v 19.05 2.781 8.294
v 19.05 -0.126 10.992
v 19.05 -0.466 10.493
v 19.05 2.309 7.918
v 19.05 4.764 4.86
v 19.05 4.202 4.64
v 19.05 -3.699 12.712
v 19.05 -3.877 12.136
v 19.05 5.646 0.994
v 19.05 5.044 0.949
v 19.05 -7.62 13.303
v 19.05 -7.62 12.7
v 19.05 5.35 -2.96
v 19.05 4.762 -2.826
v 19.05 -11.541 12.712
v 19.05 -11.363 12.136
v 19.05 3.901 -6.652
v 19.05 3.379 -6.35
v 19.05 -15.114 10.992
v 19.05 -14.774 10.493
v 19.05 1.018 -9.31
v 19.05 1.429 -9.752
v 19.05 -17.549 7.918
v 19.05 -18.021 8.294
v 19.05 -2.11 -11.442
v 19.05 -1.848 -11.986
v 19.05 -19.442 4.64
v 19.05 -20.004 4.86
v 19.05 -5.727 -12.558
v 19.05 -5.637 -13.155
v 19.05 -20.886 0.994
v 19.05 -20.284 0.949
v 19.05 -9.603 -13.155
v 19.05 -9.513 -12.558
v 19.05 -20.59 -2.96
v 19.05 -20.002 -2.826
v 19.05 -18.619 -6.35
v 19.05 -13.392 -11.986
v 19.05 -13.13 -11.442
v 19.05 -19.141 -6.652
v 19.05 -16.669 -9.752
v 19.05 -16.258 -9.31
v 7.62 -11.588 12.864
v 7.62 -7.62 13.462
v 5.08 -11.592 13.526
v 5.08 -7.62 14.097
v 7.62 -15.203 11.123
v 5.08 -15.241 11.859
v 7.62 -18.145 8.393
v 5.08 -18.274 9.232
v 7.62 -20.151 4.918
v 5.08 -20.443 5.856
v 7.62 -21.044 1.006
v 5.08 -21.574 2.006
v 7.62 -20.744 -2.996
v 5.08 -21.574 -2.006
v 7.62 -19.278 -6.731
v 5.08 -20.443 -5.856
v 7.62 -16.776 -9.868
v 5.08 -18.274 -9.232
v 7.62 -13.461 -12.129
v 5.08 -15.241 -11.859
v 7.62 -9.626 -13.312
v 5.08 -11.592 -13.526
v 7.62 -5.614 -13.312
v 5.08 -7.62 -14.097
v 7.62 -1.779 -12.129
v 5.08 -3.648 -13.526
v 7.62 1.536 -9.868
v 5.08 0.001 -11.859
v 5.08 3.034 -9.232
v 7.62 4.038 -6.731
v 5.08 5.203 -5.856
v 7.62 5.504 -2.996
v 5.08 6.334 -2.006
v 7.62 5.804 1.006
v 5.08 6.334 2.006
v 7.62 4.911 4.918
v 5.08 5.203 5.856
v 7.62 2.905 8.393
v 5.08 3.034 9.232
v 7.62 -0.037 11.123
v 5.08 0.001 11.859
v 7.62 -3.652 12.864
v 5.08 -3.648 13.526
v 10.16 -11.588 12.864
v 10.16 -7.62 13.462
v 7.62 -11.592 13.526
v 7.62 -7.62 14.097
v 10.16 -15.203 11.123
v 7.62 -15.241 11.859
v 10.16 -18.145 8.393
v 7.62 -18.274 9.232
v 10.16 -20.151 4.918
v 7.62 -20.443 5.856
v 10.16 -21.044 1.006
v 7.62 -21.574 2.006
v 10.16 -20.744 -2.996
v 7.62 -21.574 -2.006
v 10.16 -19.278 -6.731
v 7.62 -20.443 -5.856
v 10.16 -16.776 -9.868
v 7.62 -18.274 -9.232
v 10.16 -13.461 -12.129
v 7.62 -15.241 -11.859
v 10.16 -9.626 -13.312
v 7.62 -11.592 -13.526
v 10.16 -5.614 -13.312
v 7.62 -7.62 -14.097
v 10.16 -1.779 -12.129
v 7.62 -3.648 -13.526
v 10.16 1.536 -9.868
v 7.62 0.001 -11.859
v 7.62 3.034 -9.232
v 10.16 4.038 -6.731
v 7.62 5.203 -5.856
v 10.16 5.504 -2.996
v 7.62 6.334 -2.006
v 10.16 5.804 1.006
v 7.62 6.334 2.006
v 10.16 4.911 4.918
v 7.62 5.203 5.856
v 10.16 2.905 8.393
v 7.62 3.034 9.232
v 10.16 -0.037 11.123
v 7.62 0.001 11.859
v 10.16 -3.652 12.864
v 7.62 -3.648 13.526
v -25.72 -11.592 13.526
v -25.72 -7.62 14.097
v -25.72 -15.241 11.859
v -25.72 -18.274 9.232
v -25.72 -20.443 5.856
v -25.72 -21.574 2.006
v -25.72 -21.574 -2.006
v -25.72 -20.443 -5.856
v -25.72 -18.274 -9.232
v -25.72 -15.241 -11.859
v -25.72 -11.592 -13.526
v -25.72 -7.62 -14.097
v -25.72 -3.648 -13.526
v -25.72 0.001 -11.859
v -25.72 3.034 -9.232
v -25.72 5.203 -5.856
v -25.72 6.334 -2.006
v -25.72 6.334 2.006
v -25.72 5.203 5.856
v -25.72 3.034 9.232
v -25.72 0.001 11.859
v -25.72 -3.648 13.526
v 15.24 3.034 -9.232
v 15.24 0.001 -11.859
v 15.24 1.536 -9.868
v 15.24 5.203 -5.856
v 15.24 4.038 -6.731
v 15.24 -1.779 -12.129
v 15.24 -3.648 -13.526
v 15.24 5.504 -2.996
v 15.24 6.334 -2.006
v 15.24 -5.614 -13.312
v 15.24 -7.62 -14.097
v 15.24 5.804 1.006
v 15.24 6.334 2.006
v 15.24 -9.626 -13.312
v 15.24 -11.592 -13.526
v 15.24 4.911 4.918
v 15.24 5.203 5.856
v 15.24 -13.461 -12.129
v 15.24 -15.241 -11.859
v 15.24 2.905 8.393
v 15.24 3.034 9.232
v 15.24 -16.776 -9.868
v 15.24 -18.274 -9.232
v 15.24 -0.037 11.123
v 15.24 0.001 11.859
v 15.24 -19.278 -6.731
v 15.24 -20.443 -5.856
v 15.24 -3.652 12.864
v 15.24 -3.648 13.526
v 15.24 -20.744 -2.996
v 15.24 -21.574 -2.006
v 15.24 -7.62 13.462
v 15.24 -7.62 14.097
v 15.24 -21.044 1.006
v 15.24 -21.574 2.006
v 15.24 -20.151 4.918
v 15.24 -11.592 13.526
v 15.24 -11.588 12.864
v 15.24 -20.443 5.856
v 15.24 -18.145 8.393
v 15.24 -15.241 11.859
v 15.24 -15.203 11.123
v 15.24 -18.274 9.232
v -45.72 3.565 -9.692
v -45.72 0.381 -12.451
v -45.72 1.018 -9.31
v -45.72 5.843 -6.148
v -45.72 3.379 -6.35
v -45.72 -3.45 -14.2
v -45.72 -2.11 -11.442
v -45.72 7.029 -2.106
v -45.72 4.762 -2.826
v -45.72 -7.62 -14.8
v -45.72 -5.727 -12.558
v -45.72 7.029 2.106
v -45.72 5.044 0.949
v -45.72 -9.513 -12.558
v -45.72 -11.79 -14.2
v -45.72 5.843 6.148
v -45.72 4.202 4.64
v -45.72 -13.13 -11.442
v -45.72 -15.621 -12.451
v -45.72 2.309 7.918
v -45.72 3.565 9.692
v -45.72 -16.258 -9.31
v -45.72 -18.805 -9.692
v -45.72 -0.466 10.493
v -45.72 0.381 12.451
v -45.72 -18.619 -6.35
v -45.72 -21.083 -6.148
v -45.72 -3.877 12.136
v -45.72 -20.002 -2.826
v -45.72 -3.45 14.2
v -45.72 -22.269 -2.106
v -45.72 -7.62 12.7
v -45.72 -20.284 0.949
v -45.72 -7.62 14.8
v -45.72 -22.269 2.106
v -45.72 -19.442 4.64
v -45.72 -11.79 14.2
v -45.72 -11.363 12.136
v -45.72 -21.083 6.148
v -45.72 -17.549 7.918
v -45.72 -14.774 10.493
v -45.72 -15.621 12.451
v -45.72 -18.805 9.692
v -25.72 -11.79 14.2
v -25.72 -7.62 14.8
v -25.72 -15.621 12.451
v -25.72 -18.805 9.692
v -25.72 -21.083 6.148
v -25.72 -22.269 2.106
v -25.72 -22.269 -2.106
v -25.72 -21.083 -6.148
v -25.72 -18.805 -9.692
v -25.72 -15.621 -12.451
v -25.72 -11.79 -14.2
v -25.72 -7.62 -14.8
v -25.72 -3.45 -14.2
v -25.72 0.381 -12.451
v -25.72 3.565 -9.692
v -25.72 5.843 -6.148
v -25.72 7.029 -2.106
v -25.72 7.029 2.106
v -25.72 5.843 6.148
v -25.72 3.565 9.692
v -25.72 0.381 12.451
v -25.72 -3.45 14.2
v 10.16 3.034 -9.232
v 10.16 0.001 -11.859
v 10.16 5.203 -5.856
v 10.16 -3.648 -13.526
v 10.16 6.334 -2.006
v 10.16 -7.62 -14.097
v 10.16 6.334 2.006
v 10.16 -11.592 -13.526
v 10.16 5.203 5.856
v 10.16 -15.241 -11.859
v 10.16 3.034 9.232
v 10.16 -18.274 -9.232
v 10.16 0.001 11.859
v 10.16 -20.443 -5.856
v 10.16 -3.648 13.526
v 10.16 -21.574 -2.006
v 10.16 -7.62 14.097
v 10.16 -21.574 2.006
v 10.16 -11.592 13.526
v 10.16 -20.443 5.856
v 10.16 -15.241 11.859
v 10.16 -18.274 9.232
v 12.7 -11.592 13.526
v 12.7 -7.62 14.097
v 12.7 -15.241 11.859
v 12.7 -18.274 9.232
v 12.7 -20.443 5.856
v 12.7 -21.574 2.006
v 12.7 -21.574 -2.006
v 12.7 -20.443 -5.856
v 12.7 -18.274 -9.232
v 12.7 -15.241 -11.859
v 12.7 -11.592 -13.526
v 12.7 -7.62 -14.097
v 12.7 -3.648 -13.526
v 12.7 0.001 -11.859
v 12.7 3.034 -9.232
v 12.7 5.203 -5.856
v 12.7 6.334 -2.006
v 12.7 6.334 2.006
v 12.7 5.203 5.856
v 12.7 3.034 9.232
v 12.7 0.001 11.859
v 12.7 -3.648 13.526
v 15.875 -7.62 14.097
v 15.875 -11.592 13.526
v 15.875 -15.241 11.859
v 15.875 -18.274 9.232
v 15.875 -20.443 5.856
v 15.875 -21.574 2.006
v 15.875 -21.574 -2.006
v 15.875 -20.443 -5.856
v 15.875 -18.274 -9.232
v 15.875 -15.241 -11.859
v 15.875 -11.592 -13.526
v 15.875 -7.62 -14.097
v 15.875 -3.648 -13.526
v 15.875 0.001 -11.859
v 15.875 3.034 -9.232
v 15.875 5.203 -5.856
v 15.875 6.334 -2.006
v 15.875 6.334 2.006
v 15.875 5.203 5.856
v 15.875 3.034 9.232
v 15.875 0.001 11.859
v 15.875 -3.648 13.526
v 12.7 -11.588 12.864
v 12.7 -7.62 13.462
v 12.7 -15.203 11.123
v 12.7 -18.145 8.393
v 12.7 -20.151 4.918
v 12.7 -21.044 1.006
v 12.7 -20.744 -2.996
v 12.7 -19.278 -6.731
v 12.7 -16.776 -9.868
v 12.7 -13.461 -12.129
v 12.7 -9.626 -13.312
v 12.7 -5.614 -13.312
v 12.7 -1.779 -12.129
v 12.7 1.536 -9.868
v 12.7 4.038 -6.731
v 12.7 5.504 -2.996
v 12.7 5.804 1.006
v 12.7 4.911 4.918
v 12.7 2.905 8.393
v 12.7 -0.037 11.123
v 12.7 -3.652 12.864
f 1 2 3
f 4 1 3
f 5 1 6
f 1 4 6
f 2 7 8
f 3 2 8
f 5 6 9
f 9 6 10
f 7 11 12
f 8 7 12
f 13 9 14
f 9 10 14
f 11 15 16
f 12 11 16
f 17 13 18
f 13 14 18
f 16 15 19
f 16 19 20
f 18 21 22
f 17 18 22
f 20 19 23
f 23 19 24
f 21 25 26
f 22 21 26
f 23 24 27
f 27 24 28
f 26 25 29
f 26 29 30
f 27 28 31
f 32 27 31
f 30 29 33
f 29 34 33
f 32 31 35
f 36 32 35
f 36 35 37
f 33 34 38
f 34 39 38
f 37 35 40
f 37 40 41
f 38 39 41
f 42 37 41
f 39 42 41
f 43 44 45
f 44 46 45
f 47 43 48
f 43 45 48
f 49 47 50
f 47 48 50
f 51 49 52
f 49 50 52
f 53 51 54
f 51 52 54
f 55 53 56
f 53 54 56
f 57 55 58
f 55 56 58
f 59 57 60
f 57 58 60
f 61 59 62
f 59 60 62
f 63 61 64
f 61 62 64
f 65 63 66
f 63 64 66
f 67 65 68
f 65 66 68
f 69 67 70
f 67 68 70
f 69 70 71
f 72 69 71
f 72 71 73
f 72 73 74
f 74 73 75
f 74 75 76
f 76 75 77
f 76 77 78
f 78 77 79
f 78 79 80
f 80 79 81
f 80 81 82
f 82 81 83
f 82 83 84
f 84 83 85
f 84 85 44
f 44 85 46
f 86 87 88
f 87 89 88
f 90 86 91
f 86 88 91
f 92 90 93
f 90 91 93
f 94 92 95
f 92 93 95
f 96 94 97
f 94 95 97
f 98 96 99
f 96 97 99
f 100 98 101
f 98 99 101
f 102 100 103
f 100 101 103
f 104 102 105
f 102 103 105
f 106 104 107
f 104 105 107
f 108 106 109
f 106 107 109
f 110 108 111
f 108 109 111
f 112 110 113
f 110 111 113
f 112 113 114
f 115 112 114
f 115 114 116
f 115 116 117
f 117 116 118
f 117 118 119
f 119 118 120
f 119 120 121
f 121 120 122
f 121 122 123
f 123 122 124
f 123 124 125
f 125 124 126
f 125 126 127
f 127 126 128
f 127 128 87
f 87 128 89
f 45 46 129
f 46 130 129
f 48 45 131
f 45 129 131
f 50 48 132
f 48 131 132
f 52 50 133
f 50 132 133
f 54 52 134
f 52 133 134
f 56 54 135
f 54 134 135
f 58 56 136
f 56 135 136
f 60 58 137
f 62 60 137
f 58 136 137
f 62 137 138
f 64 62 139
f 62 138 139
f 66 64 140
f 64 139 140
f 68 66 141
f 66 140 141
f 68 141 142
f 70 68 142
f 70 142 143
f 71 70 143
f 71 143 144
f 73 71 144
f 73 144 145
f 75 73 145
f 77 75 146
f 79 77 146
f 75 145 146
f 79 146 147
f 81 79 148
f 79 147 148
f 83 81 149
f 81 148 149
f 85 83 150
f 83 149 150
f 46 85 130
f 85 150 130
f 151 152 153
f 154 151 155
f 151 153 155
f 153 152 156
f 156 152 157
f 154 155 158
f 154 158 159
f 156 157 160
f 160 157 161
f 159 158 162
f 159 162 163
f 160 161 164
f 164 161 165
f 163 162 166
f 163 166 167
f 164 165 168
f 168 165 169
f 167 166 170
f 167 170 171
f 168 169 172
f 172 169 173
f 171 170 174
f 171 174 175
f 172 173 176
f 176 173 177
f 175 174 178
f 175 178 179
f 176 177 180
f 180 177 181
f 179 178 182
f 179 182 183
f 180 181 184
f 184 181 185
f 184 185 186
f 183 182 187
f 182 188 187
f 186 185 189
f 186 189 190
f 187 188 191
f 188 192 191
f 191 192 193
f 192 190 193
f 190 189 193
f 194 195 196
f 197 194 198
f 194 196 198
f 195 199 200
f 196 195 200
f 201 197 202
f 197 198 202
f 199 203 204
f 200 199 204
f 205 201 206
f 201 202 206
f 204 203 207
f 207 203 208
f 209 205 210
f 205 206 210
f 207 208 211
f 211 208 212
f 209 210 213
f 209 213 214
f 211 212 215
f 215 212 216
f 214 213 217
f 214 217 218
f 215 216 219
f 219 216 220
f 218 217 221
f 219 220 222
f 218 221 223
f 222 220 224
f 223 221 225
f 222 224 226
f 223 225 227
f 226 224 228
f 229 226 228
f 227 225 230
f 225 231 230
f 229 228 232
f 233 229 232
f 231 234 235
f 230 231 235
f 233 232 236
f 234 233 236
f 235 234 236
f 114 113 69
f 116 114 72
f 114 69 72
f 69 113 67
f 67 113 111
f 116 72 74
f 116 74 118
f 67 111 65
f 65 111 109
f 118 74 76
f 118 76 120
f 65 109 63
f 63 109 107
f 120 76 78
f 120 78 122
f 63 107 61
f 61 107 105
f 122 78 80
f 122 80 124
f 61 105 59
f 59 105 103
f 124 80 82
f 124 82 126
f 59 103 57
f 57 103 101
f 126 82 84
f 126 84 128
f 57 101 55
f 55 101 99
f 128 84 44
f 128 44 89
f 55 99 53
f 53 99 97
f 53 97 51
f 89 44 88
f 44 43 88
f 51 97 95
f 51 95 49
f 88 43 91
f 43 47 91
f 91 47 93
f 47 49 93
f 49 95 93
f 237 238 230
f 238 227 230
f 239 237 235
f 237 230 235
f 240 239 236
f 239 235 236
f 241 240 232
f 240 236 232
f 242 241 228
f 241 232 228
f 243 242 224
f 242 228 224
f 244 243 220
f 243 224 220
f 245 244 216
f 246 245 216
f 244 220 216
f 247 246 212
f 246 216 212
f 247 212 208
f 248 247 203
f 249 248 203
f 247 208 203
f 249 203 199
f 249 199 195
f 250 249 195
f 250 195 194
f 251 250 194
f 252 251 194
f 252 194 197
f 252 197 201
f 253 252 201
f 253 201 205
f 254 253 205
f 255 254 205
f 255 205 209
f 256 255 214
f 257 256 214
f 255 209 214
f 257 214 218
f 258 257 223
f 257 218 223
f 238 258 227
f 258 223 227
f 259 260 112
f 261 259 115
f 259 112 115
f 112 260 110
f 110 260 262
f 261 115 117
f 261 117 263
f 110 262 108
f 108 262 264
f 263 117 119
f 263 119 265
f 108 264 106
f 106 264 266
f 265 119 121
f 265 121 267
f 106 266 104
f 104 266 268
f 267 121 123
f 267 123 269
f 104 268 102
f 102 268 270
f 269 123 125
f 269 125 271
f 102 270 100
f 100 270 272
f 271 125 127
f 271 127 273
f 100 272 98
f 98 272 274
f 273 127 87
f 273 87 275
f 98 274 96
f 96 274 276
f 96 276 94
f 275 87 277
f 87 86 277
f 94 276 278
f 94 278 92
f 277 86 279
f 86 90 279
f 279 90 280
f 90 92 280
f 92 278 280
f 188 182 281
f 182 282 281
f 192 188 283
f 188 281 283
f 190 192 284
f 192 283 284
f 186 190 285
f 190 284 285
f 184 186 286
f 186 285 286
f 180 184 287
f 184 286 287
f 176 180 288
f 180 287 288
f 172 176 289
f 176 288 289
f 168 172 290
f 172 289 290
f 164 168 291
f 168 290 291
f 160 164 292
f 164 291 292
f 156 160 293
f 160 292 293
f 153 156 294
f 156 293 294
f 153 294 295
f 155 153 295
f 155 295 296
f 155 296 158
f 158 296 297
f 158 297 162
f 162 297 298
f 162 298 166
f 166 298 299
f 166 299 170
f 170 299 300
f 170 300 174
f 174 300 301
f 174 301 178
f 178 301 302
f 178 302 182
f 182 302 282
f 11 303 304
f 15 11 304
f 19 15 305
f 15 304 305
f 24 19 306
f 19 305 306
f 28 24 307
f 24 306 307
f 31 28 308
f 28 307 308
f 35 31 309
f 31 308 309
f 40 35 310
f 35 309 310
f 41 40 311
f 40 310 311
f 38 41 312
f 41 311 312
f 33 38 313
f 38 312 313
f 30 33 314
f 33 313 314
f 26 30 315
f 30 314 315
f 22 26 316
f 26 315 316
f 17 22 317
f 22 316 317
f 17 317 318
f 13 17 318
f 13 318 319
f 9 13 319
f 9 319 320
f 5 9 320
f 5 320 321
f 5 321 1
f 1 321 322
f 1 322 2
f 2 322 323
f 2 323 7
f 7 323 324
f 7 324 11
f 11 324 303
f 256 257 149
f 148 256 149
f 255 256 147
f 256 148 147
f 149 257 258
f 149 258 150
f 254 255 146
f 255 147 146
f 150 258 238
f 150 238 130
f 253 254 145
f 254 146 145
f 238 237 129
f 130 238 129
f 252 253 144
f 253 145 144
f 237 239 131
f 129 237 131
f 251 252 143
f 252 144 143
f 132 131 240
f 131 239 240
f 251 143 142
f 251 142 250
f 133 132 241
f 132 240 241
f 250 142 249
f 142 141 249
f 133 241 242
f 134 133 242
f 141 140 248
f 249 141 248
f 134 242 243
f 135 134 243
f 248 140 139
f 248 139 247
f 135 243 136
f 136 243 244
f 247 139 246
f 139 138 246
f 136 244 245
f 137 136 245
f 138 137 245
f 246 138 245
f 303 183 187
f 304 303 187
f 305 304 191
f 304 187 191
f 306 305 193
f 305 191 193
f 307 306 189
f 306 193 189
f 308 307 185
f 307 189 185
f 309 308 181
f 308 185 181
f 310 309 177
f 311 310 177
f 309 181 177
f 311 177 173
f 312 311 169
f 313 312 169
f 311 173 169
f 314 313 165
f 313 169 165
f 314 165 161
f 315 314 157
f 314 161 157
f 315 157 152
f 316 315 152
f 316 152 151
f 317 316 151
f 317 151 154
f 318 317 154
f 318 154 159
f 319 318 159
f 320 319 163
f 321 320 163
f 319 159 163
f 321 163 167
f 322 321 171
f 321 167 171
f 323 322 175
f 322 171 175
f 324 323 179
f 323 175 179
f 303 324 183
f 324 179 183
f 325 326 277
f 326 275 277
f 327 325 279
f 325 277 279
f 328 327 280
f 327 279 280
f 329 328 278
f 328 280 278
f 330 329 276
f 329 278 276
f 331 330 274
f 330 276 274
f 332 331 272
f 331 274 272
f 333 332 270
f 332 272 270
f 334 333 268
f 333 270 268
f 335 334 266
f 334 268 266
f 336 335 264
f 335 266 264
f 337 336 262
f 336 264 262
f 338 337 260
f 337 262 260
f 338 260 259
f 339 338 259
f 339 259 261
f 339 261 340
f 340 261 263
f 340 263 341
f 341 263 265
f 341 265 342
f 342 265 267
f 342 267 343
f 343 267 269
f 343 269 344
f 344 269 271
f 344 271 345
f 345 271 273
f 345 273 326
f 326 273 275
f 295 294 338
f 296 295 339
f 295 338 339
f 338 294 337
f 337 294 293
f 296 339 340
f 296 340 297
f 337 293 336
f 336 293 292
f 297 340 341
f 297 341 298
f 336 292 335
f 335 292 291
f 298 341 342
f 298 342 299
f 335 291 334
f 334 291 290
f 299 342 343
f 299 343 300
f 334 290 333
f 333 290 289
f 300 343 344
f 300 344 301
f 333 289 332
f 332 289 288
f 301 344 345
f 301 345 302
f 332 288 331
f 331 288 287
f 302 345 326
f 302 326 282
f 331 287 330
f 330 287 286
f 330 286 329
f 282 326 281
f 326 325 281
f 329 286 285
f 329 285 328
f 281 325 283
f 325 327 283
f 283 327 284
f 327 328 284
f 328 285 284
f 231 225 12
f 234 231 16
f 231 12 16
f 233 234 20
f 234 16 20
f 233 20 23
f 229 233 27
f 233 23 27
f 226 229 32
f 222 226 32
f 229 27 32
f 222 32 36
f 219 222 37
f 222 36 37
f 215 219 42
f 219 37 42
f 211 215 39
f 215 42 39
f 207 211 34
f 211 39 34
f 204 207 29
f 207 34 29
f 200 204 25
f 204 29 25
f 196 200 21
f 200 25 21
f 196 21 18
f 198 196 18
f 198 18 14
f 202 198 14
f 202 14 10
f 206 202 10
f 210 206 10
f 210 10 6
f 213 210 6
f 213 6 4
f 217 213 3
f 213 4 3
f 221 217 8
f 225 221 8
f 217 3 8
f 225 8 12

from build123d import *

# Parameters (mm, degrees)
CHAMFER1_SIZE  = 0.79375
CHAMFER1_SIZE2 = 3.175


with BuildPart() as part:
    # Esquisse1 → Revolution1 (revolve)
    with BuildSketch(Plane.XY, mode=Mode.PRIVATE) as revolution1_sk:
        Polygon((-45.72, 5.08), (19.05, 5.08), (19.05, 6.477), (15.24, 6.477), (15.24, 5.842), (12.7, 6.477), (12.7, 5.842), (10.16, 6.477), (10.16, 5.842), (7.62, 6.477), (7.62, 5.842), (5.08, 6.477), (-25.72, 6.477), (-25.72, 7.18), (-45.72, 7.18), align=None)
    revolve(revolution1_sk.sketch.rotate(Axis((0, -7.62, 0), (1, 0, 0)), 90), axis=Axis((0, -7.62, 0), (1, 0, 0)))

    # Chamfer1
    chamfer1_edges = [part.edges().sort_by_distance(p)[0] for p in [
        (19.05, -7.62, -14.097),
    ]]
    chamfer1_side = [part.faces().sort_by_distance(p)[0] for p in [
        (19.05, -7.62, -13.098723372),
    ]]
    chamfer(chamfer1_edges, length=CHAMFER1_SIZE, length2=CHAMFER1_SIZE2, reference=chamfer1_side[0])


solid = part.part
